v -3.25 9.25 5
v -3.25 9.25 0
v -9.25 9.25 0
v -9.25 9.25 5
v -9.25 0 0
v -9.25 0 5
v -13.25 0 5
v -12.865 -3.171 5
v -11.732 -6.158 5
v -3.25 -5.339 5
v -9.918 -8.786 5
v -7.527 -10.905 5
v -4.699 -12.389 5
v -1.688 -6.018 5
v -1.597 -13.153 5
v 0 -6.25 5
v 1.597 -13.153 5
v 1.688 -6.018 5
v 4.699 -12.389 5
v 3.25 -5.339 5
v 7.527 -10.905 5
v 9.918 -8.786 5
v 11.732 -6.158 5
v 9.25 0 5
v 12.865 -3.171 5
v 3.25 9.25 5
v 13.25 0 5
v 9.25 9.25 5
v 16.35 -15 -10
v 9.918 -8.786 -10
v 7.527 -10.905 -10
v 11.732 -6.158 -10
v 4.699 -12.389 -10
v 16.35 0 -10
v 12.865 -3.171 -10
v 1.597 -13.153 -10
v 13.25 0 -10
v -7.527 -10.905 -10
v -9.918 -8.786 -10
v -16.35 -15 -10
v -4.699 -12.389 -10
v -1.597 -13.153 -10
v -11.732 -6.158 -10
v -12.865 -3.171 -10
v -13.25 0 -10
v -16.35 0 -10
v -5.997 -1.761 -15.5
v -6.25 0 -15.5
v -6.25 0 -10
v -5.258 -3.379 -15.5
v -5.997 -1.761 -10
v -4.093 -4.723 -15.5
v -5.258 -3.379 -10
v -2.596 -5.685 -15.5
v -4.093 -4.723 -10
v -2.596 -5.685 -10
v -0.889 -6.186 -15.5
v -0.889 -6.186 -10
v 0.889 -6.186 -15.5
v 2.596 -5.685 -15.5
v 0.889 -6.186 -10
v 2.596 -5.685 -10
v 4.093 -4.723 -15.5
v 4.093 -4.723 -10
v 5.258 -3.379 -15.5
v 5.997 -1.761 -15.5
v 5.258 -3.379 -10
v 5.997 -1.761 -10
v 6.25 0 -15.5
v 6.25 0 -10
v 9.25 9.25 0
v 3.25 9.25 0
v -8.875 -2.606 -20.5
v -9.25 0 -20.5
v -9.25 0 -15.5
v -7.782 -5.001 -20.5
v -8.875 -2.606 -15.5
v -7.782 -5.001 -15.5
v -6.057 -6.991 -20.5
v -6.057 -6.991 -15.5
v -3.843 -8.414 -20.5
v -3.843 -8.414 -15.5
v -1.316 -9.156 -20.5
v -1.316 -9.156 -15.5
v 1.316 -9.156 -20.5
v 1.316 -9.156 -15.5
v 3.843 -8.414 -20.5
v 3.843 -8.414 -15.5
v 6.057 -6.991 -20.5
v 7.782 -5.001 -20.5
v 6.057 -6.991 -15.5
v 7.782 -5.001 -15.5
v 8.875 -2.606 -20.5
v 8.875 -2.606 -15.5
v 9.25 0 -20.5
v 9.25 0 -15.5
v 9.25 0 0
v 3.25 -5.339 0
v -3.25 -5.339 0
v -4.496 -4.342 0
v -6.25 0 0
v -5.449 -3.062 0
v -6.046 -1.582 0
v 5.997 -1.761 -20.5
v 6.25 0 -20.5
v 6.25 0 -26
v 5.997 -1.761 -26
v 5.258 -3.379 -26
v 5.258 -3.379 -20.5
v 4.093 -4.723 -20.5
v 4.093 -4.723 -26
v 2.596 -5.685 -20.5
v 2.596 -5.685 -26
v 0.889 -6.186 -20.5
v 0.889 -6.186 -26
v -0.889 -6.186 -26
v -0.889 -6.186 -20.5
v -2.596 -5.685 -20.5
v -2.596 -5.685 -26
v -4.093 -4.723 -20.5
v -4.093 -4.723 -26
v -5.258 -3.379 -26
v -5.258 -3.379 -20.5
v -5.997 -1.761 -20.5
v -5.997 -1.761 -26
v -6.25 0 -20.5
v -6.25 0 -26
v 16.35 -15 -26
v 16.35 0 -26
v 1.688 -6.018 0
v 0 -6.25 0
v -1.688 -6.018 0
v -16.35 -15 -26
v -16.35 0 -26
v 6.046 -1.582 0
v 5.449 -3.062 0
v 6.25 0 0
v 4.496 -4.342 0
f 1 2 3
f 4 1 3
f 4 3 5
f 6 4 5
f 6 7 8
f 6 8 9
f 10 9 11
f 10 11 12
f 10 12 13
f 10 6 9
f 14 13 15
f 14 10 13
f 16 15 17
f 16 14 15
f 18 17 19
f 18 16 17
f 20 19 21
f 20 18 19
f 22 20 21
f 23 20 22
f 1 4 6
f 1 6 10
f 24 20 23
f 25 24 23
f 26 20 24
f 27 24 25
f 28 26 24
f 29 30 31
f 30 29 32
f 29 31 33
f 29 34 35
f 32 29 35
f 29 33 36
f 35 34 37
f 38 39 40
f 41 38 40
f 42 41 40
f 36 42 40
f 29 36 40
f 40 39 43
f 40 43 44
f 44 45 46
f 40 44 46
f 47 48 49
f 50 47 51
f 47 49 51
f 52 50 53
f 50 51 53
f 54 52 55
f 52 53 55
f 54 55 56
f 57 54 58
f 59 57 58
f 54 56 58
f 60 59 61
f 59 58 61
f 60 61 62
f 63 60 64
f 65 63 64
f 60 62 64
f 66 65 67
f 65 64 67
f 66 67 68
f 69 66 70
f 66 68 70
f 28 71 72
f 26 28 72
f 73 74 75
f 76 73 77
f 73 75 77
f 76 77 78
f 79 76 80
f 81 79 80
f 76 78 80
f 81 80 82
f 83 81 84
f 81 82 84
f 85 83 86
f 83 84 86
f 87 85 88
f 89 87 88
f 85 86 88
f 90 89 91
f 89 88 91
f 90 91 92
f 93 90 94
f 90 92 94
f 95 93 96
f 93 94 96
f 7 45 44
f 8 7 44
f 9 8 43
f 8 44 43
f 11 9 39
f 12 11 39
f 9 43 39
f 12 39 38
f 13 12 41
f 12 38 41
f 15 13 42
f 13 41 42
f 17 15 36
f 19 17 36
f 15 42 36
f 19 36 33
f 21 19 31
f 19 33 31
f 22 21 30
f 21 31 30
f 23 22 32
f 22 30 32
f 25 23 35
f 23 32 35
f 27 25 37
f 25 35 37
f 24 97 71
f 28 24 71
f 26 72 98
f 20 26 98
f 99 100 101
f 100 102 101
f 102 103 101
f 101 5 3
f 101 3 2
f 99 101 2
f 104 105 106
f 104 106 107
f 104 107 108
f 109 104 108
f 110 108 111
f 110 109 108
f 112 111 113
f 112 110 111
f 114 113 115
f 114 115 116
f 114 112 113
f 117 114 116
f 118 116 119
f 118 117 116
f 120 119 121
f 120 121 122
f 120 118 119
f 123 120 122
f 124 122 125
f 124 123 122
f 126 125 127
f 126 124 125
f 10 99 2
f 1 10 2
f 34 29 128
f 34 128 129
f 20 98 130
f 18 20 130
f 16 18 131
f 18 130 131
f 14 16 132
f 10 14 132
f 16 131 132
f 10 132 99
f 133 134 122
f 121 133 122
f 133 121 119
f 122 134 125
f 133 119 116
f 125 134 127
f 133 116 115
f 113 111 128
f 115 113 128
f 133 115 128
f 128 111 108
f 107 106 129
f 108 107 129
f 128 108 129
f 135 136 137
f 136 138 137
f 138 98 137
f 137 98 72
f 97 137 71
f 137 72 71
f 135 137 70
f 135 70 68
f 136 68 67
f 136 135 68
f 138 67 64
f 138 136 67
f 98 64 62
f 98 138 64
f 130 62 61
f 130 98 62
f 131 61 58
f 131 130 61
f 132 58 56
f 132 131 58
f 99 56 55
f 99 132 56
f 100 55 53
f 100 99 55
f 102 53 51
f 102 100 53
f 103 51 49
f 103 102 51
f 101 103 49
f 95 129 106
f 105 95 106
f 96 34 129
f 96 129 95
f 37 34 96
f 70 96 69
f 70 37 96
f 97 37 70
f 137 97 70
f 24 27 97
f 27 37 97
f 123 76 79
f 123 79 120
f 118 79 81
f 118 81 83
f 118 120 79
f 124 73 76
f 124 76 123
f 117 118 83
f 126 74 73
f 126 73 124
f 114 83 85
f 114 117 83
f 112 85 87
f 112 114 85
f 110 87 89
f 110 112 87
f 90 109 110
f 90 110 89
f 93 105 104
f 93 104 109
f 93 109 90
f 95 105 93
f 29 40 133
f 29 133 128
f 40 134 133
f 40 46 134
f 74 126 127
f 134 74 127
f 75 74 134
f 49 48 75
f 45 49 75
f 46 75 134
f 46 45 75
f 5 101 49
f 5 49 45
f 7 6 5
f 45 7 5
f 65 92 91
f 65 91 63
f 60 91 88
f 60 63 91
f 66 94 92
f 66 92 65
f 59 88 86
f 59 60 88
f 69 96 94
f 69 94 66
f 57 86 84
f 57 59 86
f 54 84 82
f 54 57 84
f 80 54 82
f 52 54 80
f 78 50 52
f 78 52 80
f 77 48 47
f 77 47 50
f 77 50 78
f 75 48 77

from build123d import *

# Parameters (mm, degrees)
EXTRUDE_1_DEPTH = 5
EXTRUDE_3_DEPTH = 10
EXTRUDE_4_DEPTH = 10.5
EXTRUDE_6_DEPTH = 15
EXTRUDE_7_DEPTH = 5.5
EXTRUDE_8_DEPTH = 5.5


with BuildPart() as part:
    # 草图1 → 凸台-拉伸1 (new body)
    with BuildSketch(Plane.XY):
        with BuildLine():
            Line((-3.25, 9.25), (-9.25, 9.25))
            Line((-9.25, 9.25), (-9.25, -1.7e-08))
            ThreePointArc((-9.25, -1.7e-08), (9e-09, -9.25), (9.25, 0))
            Line((9.25, 0), (9.25, 9.25))
            Line((9.25, 9.25), (3.25, 9.25))
            Line((3.25, 9.25), (3.25, -5.338539126))
            ThreePointArc((3.25, -5.338539126), (0, -6.25), (-3.25, -5.338539126))
            Line((-3.25, -5.338539126), (-3.25, 9.25))
        make_face()
    extrude(amount=EXTRUDE_1_DEPTH)

    # 草图1<4> → 凸台-拉伸3 (add)
    with BuildSketch(Plane.XY):
        with BuildLine():
            Line((-6.25, 0), (-9.25, 0))
            ThreePointArc((-9.25, -1.7e-08), (9e-09, -9.25), (9.25, 0))
            Line((9.25, 0), (6.25, 0))
            ThreePointArc((6.25, 0), (9e-09, -6.25), (-6.25, -1.8e-08))
        make_face()
    extrude(amount=-EXTRUDE_3_DEPTH)



with BuildPart() as body_2:
    # 草图2 → 凸台-拉伸4 (new body)
    with BuildSketch(Plane(origin=(0, 0, -10), x_dir=(-1, 0, 0), z_dir=(0, 0, -1))):
        with BuildLine():
            ThreePointArc((9.25, 0), (0, -9.25), (-9.25, 0))
            Line((-9.25, 0), (-16.35, 0))
            Line((-16.35, 0), (-16.35, -15))
            Line((-16.35, -15), (16.35, -15))
            Line((16.35, -15), (16.35, 0))
            Line((16.35, 0), (9.25, 0))
        make_face()
    extrude(amount=EXTRUDE_4_DEPTH)


with BuildPart() as part_1:
    add(part.part)

    add(body_2.part)  # 凸台-拉伸6 merges body 2
    # 草图5 → 凸台-拉伸6 (add)
    with BuildSketch(Plane.XY.offset(-10)):
        with BuildLine():
            ThreePointArc((9.25, 0), (0, -9.25), (-9.25, 0))
            Line((-9.25, 0), (-13.25, 0))
            ThreePointArc((-13.25, 0), (0, -13.25), (13.25, 0))
            Line((13.25, 0), (9.25, 0))
        make_face()
    extrude(amount=EXTRUDE_6_DEPTH)

    # 草图6 → 凸台-拉伸7 (add)
    with BuildSketch(Plane(origin=(0, 0, -10), x_dir=(-1, 0, 0), z_dir=(0, 0, -1))):
        with BuildLine():
            Line((9.25, 0), (6.25, 0))
            ThreePointArc((6.25, 0), (0, -6.25), (-6.25, 0))
            Line((-6.25, 0), (-9.25, 0))
            ThreePointArc((-9.25, 0), (0, -9.25), (9.25, 0))
        make_face()
    extrude(amount=EXTRUDE_7_DEPTH)

    # 草图7 → 凸台-拉伸8 (add)
    with BuildSketch(Plane(origin=(0, 0, -20.5), x_dir=(-1, 0, 0), z_dir=(0, 0, -1))):
        with BuildLine():
            Line((16.35, 0), (16.35, -15))
            Line((16.35, -15), (-16.35, -15))
            Line((-16.35, -15), (-16.35, 0))
            Line((-16.35, 0), (-6.25, 0))
            ThreePointArc((-6.25, 0), (0, -6.25), (6.25, 0))
            Line((6.25, 0), (16.35, 0))
        make_face()
    extrude(amount=EXTRUDE_8_DEPTH)


solid = part_1.part
